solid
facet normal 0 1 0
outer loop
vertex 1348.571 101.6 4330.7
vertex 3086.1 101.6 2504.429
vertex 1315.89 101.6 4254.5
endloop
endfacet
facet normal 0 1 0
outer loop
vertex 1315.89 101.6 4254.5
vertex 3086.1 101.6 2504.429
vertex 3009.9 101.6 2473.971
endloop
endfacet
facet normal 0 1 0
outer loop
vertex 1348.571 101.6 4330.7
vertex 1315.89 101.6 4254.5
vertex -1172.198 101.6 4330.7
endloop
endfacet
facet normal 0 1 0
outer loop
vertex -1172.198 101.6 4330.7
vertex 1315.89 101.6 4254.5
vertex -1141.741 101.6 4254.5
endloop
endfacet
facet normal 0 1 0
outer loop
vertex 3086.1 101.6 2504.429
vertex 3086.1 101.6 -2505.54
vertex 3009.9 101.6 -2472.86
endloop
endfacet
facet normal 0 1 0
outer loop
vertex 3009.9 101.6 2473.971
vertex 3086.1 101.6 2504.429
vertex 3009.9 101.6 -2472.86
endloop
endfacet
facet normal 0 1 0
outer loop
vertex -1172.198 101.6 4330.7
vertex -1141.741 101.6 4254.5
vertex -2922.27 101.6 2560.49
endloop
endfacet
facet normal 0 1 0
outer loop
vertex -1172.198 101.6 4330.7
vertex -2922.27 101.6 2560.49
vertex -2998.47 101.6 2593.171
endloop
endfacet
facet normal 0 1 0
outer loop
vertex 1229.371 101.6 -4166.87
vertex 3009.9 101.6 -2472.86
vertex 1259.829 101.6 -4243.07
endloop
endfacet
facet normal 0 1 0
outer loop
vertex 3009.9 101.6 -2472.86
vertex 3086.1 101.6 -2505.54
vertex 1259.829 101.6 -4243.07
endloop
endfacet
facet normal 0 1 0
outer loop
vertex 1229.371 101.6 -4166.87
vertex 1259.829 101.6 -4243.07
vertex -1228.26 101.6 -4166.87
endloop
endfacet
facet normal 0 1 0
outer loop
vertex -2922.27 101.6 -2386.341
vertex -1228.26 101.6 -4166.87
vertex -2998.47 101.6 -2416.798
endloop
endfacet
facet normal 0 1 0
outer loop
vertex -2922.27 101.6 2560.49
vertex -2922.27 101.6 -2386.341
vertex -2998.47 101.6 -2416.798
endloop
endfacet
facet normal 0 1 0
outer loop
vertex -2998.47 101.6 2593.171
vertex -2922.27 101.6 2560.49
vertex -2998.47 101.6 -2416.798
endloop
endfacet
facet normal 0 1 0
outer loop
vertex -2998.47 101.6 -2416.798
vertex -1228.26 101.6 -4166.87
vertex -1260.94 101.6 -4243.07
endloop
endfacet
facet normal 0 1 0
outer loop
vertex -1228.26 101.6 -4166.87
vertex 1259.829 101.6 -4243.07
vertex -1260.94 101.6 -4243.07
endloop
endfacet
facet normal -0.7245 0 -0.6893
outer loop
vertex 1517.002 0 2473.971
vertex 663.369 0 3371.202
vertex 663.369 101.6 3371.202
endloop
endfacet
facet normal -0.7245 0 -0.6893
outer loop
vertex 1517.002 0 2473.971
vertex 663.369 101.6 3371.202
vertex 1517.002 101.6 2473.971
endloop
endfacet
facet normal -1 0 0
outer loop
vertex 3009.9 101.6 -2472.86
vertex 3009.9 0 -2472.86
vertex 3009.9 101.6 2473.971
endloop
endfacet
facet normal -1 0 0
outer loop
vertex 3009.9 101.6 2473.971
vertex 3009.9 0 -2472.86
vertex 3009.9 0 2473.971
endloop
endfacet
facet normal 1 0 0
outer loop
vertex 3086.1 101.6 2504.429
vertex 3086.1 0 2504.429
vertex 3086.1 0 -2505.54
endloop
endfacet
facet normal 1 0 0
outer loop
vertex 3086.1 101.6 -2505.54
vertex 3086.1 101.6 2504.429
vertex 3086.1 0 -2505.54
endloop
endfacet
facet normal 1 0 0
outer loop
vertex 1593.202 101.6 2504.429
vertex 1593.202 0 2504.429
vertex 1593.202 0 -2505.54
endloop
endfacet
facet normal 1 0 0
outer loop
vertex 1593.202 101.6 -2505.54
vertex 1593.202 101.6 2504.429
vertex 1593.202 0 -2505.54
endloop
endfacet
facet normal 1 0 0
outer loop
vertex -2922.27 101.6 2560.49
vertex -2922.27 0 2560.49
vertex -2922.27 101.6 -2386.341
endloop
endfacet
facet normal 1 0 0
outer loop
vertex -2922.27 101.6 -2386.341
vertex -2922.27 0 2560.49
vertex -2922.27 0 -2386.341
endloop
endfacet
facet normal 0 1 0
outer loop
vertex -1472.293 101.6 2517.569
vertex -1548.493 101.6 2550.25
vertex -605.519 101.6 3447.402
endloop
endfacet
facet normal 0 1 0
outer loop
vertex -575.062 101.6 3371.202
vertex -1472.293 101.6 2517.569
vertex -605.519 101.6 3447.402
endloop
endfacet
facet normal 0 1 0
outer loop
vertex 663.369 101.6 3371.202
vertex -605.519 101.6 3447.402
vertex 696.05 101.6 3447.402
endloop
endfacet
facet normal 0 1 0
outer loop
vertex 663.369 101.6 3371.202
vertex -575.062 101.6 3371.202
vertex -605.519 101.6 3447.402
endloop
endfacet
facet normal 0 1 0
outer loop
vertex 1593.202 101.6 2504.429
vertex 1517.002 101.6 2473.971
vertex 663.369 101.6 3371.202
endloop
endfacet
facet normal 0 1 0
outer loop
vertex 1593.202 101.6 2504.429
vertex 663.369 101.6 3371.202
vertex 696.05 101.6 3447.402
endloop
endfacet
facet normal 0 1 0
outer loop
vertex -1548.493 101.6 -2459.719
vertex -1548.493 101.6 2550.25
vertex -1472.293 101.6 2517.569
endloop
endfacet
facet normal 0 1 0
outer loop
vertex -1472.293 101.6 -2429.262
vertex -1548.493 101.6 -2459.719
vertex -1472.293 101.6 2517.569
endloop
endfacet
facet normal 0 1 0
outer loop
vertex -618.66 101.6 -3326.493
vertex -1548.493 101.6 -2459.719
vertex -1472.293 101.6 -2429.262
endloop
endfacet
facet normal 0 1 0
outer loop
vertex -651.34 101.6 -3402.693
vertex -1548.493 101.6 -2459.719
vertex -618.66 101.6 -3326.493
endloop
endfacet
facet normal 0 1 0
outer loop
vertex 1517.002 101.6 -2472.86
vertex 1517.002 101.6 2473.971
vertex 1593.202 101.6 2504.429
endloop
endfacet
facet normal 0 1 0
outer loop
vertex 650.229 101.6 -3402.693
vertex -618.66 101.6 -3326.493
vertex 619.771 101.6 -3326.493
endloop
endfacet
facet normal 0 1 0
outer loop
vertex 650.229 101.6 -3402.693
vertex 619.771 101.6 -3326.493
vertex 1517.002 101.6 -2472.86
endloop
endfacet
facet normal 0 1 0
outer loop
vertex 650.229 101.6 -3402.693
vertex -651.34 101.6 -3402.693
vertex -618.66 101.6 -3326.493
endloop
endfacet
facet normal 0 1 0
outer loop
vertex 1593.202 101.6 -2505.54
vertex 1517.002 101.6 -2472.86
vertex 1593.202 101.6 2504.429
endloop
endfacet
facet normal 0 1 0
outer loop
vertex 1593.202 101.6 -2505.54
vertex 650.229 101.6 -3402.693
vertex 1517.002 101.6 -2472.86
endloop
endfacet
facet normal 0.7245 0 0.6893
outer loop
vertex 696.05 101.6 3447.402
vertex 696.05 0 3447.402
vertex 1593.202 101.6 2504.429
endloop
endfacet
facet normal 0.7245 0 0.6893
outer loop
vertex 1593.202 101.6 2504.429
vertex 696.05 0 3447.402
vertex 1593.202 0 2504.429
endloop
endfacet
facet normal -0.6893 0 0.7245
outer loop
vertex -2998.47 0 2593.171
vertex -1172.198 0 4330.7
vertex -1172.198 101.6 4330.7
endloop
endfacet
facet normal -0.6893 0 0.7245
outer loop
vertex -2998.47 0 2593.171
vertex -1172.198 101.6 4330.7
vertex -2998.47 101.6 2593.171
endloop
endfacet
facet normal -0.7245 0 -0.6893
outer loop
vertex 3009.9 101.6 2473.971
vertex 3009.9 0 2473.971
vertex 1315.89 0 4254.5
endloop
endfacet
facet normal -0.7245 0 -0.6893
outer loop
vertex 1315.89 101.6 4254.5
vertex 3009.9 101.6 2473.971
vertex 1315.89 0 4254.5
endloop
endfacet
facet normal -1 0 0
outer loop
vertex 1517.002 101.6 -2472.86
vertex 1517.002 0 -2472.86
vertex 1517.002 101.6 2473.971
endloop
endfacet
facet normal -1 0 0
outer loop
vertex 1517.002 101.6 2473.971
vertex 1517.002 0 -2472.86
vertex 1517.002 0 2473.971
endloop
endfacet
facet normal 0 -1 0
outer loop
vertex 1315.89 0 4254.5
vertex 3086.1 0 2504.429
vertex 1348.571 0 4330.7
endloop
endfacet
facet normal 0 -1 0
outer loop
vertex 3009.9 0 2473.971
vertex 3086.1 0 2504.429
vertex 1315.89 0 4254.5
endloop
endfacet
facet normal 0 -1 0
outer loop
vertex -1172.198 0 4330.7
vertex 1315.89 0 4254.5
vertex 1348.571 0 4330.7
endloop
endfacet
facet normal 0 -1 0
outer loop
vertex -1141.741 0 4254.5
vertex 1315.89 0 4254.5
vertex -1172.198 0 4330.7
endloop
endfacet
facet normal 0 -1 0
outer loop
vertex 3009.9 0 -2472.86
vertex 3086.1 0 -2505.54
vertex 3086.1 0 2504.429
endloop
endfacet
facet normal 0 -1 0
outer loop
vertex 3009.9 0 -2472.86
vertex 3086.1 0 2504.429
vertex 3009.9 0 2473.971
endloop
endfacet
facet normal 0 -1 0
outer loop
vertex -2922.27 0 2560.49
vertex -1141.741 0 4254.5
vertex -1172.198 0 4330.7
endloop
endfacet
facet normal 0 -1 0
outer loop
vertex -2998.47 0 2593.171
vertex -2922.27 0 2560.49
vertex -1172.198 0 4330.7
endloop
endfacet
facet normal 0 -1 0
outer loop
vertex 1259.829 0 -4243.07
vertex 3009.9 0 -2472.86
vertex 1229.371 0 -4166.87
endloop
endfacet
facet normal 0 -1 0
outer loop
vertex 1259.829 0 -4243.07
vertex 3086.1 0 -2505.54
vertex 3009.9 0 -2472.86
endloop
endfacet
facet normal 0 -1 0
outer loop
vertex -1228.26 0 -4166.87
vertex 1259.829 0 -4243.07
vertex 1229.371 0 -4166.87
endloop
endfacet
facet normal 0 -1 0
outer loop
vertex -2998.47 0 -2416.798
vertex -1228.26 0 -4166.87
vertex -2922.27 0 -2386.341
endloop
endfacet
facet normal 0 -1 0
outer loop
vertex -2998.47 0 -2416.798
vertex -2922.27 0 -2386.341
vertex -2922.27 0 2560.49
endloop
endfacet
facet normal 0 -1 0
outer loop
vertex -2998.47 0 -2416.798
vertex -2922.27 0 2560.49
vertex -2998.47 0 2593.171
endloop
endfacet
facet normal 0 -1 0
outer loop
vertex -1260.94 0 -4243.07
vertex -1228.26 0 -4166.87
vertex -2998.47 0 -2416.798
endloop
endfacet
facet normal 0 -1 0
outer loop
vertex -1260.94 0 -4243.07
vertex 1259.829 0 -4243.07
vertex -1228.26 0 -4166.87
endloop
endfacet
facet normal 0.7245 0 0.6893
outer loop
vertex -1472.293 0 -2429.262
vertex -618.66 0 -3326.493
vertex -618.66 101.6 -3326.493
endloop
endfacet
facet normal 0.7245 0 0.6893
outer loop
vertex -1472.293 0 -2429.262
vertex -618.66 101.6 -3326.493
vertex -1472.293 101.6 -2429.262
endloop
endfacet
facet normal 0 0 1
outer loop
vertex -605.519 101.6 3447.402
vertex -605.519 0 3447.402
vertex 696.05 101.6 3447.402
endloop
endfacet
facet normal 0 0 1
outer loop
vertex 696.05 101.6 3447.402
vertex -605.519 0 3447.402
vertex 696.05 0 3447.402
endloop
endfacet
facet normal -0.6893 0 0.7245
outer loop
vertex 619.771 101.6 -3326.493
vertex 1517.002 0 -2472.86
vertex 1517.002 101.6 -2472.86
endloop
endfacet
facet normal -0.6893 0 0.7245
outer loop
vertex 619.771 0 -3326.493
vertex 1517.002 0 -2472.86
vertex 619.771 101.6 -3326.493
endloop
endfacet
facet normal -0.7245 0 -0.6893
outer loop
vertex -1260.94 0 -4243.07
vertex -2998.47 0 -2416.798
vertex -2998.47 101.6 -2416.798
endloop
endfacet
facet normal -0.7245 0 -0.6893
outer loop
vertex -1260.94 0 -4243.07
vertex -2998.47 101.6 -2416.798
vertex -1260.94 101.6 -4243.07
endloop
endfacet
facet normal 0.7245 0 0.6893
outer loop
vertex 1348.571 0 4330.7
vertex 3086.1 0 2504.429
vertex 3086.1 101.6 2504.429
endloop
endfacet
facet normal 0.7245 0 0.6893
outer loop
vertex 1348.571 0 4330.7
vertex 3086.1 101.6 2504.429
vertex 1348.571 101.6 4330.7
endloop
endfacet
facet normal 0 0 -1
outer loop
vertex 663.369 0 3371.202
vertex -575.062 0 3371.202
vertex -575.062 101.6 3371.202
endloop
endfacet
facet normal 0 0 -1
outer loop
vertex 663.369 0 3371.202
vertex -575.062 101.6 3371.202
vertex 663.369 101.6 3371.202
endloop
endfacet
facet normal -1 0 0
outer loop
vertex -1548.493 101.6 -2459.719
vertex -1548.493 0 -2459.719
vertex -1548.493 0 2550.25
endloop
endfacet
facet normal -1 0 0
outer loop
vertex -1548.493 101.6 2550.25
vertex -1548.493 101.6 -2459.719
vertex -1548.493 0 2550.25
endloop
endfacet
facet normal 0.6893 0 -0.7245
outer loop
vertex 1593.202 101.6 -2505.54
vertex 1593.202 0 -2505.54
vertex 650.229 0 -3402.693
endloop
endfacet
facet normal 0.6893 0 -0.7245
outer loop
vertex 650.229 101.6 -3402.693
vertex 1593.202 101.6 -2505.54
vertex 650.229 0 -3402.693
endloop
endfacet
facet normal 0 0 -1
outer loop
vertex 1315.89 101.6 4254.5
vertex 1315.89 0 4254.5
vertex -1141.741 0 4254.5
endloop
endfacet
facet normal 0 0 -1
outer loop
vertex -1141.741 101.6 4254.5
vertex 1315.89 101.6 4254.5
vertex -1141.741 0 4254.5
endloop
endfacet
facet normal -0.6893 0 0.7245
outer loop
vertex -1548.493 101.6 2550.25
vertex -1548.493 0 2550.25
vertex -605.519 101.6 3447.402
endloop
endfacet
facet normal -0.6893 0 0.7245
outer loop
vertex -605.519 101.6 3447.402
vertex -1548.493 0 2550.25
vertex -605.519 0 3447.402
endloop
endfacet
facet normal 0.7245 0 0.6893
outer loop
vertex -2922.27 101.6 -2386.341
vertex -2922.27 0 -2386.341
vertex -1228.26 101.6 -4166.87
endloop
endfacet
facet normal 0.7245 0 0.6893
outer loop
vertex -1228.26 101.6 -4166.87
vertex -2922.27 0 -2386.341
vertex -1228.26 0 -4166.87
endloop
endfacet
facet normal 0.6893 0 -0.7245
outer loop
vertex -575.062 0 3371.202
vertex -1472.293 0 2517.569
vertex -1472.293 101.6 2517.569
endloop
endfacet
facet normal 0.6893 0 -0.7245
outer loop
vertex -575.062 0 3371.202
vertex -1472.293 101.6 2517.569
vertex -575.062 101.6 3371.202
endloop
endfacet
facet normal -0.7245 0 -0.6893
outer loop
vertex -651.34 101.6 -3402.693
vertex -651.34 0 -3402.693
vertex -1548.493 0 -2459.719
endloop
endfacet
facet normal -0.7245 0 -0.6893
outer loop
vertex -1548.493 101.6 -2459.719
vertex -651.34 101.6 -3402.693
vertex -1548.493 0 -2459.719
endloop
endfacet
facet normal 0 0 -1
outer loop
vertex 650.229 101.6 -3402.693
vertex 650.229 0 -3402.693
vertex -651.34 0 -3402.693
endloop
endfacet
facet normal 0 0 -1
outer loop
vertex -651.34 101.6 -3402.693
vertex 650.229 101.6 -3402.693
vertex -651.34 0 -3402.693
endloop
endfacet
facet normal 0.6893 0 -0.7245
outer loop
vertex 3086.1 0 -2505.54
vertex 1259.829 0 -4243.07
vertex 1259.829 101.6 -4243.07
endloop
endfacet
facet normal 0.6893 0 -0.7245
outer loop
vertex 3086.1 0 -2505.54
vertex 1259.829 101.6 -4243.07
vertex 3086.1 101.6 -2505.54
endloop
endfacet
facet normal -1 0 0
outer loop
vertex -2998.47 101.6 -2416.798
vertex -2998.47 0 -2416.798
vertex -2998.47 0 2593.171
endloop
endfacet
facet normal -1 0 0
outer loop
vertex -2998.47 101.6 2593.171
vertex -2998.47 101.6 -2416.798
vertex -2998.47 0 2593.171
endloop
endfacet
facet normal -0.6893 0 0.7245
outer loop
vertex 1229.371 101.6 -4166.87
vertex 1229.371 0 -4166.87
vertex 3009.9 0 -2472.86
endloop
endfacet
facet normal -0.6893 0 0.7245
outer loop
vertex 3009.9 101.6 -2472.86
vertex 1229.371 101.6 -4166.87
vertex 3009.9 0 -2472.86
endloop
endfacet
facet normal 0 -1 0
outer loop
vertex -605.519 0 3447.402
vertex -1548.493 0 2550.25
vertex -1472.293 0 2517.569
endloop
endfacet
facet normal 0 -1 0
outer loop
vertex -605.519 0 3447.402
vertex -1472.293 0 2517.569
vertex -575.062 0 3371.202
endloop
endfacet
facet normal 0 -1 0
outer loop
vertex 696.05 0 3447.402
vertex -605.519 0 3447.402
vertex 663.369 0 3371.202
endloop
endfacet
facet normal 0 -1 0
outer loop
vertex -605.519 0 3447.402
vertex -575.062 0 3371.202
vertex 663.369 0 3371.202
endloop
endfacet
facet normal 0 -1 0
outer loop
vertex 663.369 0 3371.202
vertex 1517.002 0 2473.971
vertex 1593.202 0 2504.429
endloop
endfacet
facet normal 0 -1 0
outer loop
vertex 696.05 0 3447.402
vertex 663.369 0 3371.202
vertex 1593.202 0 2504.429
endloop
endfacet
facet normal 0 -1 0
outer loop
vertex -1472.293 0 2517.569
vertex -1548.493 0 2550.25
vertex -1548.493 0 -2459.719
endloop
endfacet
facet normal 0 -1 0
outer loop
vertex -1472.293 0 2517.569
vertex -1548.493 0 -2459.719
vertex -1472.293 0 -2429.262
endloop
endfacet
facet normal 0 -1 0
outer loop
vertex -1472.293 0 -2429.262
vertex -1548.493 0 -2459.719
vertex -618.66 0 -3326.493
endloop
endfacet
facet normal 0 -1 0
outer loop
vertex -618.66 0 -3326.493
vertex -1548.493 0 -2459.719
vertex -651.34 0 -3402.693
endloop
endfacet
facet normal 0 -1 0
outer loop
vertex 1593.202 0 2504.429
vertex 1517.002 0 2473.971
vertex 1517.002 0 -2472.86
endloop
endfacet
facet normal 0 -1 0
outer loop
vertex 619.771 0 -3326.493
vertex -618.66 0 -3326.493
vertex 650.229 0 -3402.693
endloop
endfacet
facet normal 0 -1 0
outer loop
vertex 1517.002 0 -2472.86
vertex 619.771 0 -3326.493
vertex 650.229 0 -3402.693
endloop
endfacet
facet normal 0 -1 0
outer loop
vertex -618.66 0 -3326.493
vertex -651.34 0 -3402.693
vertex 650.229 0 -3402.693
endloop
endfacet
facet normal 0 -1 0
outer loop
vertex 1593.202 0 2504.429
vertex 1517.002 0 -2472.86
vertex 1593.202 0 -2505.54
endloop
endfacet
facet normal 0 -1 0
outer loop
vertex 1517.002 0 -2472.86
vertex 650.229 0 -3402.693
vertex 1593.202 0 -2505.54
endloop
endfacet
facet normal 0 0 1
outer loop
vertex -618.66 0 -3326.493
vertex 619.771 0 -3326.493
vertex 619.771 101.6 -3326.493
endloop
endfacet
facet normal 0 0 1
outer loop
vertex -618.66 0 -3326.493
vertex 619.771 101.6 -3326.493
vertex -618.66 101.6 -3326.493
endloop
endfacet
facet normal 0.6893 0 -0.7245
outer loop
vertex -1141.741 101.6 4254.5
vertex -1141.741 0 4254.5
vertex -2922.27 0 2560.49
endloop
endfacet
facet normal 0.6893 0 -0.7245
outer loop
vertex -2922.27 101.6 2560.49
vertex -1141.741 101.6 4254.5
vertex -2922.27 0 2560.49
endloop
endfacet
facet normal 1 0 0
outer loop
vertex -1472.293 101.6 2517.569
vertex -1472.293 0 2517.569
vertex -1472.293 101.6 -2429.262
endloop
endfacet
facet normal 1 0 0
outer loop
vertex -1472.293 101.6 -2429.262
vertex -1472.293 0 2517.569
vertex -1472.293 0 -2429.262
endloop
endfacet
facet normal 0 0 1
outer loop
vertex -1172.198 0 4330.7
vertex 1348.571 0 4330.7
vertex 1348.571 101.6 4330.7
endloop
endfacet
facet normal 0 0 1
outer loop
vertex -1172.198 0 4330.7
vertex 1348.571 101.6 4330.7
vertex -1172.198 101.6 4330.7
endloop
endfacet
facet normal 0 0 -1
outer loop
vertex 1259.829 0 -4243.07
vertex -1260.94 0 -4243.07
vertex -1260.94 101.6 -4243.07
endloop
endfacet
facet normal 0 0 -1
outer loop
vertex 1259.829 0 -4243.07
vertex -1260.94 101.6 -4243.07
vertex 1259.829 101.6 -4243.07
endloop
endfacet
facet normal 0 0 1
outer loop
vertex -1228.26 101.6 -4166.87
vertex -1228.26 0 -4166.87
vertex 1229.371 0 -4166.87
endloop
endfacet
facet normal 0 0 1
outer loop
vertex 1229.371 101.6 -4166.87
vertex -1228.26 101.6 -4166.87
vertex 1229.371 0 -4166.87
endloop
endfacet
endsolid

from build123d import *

# Parameters (mm, degrees)
BOSS_EXTRUDE1_DEPTH   = 101.6
BOSS_EXTRUDE1_2_DEPTH = 101.6


with BuildPart() as part:
    # Sketch1 → Boss-Extrude1 (new body)
    with BuildSketch(Plane(origin=(0, 0, 0), x_dir=(1, 0, 0), z_dir=(0, 1, 0))):
        Polygon((-2998.469529978, -2593.170550375), (-2998.469529978, -87.630470022), (-2998.469529978, 2416.798253617), (-1260.940080353, 4243.069529978), (1259.828723639, 4243.069529978), (3086.1, 2505.540080353), (3086.1, 0), (3086.1, -2504.428723639), (1348.570550375, -4330.7), (-1172.198253617, -4330.7), align=None)
        Polygon((-1141.740806339, -4254.5), (-2922.269529978, -2560.49038967), (-2922.269529978, -87.630470022), (-2922.269529978, 2386.340806339), (-1228.259919647, 4166.869529978), (1229.371276361, 4166.869529978), (3009.9, 2472.859919647), (3009.9, 0), (3009.9, -2473.971276361), (1315.89038967, -4254.5), align=None, mode=Mode.SUBTRACT)
    extrude(amount=BOSS_EXTRUDE1_DEPTH)


with BuildPart() as body_2:
    # Sketch1 → Boss-Extrude1 2 (new body)
    with BuildSketch(Plane(origin=(0, 0, 0), x_dir=(1, 0, 0), z_dir=(0, 1, 0))):
        Polygon((-651.340080353, 3402.692617336), (-1548.492617336, 2459.719300158), (-1548.492617336, -44.709423481), (-1548.492617336, -2550.249503833), (-605.519300158, -3447.402040816), (696.049503833, -3447.402040816), (1593.202040816, -2504.428723639), (1593.202040816, 0), (1593.202040816, 2505.540080353), (650.228723639, 3402.692617336), align=None)
        Polygon((-1472.292617336, 2429.26185288), (-1472.292617336, -44.709423481), (-1472.292617336, -2517.569343128), (-575.06185288, -3371.202040816), (663.369343128, -3371.202040816), (1517.002040816, -2473.971276361), (1517.002040816, 0), (1517.002040816, 2472.859919647), (619.771276361, 3326.492617336), (-618.659919647, 3326.492617336), align=None, mode=Mode.SUBTRACT)
    extrude(amount=BOSS_EXTRUDE1_2_DEPTH)


solid = Compound([part.part, body_2.part])
